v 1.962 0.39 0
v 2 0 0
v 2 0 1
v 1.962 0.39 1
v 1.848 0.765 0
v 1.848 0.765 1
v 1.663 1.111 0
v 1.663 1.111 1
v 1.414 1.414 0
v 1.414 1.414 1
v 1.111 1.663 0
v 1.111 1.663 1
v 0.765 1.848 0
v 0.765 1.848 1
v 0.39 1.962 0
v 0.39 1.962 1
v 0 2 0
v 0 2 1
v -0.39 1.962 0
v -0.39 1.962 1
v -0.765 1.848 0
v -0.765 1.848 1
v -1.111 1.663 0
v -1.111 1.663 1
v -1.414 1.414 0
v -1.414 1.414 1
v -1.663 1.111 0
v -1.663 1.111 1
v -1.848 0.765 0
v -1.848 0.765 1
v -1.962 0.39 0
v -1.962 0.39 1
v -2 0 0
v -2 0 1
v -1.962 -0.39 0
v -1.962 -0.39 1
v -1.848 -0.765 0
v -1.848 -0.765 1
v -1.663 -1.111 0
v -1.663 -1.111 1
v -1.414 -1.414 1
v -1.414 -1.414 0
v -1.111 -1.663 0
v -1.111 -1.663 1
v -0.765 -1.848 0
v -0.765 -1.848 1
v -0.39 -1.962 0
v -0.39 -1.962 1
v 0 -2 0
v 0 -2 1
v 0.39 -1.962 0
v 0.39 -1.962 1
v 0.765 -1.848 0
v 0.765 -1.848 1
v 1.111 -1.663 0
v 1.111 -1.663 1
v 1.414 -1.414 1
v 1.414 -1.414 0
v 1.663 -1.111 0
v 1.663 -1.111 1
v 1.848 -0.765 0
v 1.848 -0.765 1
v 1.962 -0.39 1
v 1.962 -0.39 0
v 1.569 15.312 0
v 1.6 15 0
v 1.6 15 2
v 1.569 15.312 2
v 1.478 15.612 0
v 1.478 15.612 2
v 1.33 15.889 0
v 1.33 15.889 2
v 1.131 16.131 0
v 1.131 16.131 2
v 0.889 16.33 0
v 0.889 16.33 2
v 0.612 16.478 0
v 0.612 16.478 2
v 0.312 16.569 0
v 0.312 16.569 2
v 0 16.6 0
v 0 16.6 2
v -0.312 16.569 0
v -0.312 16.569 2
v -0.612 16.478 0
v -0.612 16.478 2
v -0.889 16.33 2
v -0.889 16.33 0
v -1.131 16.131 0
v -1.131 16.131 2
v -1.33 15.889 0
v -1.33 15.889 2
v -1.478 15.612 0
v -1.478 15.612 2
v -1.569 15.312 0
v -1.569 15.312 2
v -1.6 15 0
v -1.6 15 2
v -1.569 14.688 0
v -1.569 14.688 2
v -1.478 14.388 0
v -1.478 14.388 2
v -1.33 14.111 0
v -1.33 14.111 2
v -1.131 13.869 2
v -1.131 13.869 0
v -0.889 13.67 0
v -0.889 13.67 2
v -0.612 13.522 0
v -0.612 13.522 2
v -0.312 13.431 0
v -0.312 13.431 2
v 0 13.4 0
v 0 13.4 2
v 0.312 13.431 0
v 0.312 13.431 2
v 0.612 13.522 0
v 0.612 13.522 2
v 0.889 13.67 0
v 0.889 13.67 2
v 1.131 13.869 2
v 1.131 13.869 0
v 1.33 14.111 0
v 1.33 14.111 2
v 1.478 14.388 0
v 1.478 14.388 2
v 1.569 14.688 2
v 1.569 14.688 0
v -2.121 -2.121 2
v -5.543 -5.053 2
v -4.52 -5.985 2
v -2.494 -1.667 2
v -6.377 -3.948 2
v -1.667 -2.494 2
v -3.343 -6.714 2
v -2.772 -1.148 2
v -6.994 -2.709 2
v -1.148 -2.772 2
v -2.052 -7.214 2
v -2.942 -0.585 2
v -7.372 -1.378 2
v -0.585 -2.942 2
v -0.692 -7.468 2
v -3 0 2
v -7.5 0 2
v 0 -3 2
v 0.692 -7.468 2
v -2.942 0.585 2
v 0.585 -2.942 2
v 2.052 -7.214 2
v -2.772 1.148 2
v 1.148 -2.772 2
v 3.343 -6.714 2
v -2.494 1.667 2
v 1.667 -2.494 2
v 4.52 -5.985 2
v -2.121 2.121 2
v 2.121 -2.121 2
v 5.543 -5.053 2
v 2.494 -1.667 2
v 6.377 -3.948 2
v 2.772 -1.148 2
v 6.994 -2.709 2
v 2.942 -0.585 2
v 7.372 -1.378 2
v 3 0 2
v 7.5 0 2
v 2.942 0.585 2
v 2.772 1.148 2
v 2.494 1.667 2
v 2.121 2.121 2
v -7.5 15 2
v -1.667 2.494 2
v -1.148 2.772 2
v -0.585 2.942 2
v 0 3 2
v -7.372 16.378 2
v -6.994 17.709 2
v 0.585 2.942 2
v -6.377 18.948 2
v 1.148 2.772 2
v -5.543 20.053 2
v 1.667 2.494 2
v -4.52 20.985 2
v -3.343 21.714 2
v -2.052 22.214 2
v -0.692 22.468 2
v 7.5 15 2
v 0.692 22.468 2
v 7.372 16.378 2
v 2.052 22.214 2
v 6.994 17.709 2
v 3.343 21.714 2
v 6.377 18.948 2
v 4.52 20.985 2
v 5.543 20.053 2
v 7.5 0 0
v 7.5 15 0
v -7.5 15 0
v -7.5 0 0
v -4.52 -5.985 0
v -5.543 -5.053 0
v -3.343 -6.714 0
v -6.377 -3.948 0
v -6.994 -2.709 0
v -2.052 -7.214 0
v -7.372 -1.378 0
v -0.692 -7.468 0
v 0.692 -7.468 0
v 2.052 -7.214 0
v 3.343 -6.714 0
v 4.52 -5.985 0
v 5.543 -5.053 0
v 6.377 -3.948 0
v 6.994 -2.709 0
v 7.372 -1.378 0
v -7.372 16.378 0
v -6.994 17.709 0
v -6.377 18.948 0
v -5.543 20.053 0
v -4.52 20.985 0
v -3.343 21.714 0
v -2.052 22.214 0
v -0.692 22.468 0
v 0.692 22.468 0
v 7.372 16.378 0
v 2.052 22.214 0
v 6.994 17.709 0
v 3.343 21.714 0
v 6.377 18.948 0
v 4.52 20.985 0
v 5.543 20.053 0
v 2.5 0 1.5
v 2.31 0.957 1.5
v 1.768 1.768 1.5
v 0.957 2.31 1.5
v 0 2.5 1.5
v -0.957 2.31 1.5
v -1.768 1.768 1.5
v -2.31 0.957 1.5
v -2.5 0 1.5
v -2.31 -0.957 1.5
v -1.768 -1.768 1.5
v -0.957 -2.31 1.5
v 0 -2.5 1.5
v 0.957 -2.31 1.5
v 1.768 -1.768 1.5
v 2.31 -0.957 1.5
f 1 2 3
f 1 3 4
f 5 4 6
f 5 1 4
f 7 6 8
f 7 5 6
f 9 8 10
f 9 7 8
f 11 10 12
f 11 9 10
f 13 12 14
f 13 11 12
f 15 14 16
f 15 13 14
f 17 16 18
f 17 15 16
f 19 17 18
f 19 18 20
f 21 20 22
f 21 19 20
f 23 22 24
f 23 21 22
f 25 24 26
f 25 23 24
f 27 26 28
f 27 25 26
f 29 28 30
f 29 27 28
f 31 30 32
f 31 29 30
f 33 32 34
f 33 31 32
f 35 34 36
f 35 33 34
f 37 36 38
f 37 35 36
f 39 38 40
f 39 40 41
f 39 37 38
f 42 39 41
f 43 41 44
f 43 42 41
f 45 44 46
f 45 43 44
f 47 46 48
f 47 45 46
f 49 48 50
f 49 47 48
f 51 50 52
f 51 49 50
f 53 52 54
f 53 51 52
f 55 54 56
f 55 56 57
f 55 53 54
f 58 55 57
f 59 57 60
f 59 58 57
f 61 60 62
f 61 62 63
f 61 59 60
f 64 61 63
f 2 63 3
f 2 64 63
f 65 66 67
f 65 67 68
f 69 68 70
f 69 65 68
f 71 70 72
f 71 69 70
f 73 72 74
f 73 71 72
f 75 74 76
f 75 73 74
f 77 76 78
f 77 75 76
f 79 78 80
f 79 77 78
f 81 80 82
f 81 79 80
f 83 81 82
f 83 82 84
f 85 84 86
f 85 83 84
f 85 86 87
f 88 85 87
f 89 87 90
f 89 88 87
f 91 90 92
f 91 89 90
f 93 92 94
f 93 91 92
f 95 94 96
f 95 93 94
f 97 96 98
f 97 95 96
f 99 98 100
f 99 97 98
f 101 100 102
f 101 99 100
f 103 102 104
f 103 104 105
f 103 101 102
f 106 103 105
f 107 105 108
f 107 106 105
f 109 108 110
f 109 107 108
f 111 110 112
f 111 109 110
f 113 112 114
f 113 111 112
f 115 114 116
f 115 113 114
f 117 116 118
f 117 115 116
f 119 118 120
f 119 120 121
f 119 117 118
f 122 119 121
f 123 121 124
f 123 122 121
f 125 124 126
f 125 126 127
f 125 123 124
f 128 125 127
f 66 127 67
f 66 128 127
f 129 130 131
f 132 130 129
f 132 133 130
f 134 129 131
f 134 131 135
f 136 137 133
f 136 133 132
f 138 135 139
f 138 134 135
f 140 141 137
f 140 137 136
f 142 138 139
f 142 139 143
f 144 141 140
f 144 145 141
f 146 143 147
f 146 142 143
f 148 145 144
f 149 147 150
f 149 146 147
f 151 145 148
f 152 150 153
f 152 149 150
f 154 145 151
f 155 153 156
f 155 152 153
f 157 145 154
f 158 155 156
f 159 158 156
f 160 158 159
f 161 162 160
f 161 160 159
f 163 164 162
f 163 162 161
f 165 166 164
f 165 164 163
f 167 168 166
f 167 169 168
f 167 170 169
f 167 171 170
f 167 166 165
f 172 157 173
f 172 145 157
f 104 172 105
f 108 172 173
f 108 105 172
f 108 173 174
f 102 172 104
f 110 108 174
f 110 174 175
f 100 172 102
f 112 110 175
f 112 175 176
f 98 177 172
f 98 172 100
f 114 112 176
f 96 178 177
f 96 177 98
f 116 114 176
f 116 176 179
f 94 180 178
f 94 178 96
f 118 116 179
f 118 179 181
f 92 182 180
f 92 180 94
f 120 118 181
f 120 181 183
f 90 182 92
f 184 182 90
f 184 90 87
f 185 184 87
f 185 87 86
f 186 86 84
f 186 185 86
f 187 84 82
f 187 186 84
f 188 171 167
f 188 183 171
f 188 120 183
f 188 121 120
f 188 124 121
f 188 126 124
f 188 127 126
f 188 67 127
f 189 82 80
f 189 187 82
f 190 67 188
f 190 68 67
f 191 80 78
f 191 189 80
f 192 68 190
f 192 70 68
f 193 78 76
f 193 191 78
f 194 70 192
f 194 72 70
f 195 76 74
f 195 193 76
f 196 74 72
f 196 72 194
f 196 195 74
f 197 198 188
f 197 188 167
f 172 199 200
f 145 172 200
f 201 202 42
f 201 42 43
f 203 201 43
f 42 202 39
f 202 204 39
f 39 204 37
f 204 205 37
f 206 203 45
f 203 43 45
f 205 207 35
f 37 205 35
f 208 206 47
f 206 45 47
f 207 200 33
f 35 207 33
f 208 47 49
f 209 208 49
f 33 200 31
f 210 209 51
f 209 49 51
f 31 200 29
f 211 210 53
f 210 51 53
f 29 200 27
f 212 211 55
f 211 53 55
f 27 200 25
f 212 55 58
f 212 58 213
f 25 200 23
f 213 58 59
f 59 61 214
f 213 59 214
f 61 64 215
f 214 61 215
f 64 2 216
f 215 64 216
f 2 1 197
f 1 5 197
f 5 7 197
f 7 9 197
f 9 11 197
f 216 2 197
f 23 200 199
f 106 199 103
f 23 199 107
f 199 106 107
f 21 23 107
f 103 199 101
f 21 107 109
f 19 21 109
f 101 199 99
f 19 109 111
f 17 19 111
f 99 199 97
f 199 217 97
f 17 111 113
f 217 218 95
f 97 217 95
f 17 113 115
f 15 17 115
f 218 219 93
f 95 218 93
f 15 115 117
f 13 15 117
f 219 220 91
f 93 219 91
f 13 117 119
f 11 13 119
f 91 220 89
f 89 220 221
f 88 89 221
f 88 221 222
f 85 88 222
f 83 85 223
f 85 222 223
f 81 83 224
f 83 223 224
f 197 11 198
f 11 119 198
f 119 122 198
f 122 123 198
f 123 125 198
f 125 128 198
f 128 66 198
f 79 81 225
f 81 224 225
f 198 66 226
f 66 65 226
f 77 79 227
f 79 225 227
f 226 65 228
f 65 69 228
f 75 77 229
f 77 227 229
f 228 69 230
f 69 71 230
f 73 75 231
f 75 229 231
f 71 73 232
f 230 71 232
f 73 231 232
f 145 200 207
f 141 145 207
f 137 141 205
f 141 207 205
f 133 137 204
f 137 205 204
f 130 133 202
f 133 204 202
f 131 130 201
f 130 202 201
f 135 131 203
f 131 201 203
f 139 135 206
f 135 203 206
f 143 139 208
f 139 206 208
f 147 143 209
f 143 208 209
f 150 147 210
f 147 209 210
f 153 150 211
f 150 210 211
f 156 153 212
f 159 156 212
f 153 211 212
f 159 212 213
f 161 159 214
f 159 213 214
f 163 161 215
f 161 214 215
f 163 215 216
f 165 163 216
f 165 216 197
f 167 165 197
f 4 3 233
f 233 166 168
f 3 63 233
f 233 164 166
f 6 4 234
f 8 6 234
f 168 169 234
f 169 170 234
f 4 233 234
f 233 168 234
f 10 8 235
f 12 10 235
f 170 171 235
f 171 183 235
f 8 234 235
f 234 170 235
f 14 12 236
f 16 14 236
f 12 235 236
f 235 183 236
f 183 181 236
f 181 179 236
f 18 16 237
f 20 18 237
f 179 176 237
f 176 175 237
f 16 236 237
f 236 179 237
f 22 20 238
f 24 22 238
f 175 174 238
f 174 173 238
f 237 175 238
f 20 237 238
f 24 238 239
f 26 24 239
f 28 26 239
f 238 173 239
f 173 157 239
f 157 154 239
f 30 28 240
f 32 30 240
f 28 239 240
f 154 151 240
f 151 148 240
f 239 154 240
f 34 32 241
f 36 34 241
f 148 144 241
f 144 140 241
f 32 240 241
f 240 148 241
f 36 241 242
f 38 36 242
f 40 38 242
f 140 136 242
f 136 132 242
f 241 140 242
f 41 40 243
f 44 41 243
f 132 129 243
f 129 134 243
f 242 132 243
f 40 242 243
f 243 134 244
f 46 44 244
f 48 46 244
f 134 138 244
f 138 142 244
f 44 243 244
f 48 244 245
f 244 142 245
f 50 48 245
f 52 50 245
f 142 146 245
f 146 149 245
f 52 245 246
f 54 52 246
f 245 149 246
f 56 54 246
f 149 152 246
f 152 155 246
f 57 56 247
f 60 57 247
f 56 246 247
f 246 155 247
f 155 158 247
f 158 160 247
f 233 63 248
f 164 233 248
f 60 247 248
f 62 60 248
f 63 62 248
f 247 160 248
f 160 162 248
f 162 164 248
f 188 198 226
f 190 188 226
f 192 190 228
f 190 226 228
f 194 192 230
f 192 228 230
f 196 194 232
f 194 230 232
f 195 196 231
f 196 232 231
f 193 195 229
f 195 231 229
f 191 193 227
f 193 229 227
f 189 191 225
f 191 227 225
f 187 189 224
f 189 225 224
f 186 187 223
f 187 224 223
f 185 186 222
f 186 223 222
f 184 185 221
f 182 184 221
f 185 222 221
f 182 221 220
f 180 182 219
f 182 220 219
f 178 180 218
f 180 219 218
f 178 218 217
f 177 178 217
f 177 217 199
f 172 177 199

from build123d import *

# Parameters (mm, degrees)
SKETCH_R     = 1.6
SKETCH_R_2   = 2
PAD_DEPTH    = 2
CHAMFER_SIZE = 1


with BuildPart() as part:
    # Sketch → Pad (new body)
    with BuildSketch(Plane.XY):
        with BuildLine():
            ThreePointArc((7.5, 15), (0, 22.5), (-7.5, 15))
            Line((-7.5, 15), (-7.5, 0))
            ThreePointArc((-7.5, 0), (0, -7.5), (7.5, 0))
            Line((7.5, 15), (7.5, 0))
        make_face()
        with Locations((0, 15)):
            Circle(SKETCH_R, mode=Mode.SUBTRACT)
        Circle(SKETCH_R_2, mode=Mode.SUBTRACT)
    extrude(amount=PAD_DEPTH)

    # Chamfer
    chamfer_edges = [part.edges().sort_by_distance(p)[0] for p in [
        (-2, 0, 2),
    ]]
    chamfer(chamfer_edges, length=CHAMFER_SIZE)


solid = part.part
